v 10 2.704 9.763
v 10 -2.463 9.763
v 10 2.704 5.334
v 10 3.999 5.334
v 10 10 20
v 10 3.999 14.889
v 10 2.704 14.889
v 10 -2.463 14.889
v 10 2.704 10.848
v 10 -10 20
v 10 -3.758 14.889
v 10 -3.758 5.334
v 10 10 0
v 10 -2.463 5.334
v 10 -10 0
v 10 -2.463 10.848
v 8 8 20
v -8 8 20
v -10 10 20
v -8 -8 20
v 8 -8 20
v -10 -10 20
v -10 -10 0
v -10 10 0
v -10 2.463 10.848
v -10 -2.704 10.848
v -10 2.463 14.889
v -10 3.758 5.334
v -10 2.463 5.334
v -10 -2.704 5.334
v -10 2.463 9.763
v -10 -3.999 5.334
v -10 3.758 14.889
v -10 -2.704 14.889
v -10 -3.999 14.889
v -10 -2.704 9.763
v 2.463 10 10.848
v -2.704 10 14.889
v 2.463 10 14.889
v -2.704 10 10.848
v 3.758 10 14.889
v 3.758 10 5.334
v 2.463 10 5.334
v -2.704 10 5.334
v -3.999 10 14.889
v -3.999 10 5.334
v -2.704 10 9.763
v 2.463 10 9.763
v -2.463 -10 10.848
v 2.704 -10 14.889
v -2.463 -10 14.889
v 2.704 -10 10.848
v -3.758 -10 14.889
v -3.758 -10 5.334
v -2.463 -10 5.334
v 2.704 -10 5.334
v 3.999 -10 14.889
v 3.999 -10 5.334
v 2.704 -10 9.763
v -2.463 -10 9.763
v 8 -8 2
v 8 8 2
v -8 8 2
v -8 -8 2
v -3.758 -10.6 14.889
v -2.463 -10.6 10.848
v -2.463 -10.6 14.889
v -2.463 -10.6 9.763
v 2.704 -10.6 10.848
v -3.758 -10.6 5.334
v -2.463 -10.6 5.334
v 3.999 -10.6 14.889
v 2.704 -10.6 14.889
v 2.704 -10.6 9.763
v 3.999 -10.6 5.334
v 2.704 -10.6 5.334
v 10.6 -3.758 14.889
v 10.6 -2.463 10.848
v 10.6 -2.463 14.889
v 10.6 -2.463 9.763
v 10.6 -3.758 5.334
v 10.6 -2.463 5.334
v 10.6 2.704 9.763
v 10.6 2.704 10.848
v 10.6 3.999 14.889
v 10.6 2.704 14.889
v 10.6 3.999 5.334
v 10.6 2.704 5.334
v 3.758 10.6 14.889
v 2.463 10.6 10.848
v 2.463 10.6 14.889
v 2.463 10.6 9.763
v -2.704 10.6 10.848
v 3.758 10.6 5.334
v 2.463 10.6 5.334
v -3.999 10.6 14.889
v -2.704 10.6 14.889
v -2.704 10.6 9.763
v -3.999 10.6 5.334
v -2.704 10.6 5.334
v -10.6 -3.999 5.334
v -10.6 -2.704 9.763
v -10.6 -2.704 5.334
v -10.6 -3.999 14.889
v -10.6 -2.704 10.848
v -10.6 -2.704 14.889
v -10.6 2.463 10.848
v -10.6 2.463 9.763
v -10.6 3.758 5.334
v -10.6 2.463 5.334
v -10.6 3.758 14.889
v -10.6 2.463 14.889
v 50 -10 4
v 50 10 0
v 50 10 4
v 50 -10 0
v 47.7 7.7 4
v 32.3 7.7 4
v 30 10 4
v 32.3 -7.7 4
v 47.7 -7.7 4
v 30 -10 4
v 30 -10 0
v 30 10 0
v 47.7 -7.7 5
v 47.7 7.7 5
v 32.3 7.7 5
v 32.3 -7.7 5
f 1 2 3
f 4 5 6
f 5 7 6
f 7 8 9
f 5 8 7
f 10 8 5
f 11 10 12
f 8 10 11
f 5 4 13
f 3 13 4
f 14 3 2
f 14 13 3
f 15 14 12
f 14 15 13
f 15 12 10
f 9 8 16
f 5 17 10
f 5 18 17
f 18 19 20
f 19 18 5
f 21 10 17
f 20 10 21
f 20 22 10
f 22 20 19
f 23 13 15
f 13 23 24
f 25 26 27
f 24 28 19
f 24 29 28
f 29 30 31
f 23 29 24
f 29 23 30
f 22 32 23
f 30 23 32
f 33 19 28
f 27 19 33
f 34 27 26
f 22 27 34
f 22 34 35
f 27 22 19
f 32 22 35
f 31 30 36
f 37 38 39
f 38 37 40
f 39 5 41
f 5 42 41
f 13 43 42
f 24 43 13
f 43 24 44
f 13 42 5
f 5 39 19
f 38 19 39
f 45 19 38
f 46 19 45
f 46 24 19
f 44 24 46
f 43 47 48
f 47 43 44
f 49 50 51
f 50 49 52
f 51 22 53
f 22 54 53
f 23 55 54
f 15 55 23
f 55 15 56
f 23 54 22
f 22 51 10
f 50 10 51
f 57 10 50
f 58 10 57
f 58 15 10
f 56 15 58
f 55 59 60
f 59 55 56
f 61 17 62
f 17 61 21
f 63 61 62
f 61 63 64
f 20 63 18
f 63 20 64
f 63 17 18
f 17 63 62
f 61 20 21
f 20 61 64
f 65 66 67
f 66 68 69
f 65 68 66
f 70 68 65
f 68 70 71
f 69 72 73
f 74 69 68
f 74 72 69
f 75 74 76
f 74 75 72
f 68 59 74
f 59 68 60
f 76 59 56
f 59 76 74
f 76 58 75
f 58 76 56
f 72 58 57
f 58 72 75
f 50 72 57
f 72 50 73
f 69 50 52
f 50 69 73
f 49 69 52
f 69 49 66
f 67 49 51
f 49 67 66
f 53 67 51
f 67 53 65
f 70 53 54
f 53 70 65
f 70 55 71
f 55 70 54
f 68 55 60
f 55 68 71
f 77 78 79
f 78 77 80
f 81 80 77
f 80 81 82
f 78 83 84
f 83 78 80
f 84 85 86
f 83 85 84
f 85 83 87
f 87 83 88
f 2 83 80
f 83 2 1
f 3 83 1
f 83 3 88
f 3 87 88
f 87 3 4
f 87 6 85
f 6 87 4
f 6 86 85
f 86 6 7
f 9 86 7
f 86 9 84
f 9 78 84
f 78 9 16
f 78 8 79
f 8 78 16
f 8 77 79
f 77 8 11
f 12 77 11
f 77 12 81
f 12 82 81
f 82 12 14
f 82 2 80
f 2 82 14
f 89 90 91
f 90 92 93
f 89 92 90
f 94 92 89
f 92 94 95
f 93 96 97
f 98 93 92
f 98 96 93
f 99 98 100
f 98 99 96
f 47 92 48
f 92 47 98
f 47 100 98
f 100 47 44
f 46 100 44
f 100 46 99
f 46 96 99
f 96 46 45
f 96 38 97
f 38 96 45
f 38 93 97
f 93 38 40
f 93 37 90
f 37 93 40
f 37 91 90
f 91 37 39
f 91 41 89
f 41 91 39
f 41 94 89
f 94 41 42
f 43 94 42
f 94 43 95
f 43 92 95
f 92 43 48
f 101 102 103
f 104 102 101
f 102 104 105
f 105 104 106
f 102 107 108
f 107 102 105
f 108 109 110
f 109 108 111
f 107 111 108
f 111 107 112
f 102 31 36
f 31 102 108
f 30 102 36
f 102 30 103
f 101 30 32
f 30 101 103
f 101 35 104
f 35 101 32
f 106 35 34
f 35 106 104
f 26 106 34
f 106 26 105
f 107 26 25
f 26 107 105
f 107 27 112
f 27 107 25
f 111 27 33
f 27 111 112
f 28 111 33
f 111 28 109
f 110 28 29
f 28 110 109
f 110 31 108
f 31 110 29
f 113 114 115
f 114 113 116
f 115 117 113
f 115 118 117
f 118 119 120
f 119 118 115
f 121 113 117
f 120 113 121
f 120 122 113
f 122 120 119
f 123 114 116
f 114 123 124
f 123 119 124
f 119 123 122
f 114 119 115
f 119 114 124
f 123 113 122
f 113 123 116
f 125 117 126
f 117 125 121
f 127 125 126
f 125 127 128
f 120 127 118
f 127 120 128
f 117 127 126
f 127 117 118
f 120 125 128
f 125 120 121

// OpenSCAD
// Box with lid
x=20; // weidth (horiztonal )
y=20; // height (horizontal
z=20; // depth
a=2; // wall thickness
t=0.3; // tolerane of lid
ld=2; // lid depth
lh=ld + a;
th=1;

translate([0,0,z/2]){
    // box
    union(){
        difference(){
            cube([x,y,z],center=true);
            translate([0,0,a]){
                cube([x-(a*2),y-(a*2),z],center=true);
            }
        }

        
        for(i=[0:4]){
            rotate([0,0,90*i]){
                translate([0,-y/2-0.1,0]){
                    rotate([90,0,0]){
                        linear_extrude(height=th,center=true){
                            text("H",halign="center",valign="center");
                        }
                    }
                }
            }
        }
    }
}    
    // lid
translate([x*2,0,lh/2]){
    union(){
        cube([x,y,lh],center=true);
        translate([0,0,lh-a]){
            cube([x-(a*2)-(t*2),y-(a*2)-(t*2),a],center=true);
        }
    }
}
